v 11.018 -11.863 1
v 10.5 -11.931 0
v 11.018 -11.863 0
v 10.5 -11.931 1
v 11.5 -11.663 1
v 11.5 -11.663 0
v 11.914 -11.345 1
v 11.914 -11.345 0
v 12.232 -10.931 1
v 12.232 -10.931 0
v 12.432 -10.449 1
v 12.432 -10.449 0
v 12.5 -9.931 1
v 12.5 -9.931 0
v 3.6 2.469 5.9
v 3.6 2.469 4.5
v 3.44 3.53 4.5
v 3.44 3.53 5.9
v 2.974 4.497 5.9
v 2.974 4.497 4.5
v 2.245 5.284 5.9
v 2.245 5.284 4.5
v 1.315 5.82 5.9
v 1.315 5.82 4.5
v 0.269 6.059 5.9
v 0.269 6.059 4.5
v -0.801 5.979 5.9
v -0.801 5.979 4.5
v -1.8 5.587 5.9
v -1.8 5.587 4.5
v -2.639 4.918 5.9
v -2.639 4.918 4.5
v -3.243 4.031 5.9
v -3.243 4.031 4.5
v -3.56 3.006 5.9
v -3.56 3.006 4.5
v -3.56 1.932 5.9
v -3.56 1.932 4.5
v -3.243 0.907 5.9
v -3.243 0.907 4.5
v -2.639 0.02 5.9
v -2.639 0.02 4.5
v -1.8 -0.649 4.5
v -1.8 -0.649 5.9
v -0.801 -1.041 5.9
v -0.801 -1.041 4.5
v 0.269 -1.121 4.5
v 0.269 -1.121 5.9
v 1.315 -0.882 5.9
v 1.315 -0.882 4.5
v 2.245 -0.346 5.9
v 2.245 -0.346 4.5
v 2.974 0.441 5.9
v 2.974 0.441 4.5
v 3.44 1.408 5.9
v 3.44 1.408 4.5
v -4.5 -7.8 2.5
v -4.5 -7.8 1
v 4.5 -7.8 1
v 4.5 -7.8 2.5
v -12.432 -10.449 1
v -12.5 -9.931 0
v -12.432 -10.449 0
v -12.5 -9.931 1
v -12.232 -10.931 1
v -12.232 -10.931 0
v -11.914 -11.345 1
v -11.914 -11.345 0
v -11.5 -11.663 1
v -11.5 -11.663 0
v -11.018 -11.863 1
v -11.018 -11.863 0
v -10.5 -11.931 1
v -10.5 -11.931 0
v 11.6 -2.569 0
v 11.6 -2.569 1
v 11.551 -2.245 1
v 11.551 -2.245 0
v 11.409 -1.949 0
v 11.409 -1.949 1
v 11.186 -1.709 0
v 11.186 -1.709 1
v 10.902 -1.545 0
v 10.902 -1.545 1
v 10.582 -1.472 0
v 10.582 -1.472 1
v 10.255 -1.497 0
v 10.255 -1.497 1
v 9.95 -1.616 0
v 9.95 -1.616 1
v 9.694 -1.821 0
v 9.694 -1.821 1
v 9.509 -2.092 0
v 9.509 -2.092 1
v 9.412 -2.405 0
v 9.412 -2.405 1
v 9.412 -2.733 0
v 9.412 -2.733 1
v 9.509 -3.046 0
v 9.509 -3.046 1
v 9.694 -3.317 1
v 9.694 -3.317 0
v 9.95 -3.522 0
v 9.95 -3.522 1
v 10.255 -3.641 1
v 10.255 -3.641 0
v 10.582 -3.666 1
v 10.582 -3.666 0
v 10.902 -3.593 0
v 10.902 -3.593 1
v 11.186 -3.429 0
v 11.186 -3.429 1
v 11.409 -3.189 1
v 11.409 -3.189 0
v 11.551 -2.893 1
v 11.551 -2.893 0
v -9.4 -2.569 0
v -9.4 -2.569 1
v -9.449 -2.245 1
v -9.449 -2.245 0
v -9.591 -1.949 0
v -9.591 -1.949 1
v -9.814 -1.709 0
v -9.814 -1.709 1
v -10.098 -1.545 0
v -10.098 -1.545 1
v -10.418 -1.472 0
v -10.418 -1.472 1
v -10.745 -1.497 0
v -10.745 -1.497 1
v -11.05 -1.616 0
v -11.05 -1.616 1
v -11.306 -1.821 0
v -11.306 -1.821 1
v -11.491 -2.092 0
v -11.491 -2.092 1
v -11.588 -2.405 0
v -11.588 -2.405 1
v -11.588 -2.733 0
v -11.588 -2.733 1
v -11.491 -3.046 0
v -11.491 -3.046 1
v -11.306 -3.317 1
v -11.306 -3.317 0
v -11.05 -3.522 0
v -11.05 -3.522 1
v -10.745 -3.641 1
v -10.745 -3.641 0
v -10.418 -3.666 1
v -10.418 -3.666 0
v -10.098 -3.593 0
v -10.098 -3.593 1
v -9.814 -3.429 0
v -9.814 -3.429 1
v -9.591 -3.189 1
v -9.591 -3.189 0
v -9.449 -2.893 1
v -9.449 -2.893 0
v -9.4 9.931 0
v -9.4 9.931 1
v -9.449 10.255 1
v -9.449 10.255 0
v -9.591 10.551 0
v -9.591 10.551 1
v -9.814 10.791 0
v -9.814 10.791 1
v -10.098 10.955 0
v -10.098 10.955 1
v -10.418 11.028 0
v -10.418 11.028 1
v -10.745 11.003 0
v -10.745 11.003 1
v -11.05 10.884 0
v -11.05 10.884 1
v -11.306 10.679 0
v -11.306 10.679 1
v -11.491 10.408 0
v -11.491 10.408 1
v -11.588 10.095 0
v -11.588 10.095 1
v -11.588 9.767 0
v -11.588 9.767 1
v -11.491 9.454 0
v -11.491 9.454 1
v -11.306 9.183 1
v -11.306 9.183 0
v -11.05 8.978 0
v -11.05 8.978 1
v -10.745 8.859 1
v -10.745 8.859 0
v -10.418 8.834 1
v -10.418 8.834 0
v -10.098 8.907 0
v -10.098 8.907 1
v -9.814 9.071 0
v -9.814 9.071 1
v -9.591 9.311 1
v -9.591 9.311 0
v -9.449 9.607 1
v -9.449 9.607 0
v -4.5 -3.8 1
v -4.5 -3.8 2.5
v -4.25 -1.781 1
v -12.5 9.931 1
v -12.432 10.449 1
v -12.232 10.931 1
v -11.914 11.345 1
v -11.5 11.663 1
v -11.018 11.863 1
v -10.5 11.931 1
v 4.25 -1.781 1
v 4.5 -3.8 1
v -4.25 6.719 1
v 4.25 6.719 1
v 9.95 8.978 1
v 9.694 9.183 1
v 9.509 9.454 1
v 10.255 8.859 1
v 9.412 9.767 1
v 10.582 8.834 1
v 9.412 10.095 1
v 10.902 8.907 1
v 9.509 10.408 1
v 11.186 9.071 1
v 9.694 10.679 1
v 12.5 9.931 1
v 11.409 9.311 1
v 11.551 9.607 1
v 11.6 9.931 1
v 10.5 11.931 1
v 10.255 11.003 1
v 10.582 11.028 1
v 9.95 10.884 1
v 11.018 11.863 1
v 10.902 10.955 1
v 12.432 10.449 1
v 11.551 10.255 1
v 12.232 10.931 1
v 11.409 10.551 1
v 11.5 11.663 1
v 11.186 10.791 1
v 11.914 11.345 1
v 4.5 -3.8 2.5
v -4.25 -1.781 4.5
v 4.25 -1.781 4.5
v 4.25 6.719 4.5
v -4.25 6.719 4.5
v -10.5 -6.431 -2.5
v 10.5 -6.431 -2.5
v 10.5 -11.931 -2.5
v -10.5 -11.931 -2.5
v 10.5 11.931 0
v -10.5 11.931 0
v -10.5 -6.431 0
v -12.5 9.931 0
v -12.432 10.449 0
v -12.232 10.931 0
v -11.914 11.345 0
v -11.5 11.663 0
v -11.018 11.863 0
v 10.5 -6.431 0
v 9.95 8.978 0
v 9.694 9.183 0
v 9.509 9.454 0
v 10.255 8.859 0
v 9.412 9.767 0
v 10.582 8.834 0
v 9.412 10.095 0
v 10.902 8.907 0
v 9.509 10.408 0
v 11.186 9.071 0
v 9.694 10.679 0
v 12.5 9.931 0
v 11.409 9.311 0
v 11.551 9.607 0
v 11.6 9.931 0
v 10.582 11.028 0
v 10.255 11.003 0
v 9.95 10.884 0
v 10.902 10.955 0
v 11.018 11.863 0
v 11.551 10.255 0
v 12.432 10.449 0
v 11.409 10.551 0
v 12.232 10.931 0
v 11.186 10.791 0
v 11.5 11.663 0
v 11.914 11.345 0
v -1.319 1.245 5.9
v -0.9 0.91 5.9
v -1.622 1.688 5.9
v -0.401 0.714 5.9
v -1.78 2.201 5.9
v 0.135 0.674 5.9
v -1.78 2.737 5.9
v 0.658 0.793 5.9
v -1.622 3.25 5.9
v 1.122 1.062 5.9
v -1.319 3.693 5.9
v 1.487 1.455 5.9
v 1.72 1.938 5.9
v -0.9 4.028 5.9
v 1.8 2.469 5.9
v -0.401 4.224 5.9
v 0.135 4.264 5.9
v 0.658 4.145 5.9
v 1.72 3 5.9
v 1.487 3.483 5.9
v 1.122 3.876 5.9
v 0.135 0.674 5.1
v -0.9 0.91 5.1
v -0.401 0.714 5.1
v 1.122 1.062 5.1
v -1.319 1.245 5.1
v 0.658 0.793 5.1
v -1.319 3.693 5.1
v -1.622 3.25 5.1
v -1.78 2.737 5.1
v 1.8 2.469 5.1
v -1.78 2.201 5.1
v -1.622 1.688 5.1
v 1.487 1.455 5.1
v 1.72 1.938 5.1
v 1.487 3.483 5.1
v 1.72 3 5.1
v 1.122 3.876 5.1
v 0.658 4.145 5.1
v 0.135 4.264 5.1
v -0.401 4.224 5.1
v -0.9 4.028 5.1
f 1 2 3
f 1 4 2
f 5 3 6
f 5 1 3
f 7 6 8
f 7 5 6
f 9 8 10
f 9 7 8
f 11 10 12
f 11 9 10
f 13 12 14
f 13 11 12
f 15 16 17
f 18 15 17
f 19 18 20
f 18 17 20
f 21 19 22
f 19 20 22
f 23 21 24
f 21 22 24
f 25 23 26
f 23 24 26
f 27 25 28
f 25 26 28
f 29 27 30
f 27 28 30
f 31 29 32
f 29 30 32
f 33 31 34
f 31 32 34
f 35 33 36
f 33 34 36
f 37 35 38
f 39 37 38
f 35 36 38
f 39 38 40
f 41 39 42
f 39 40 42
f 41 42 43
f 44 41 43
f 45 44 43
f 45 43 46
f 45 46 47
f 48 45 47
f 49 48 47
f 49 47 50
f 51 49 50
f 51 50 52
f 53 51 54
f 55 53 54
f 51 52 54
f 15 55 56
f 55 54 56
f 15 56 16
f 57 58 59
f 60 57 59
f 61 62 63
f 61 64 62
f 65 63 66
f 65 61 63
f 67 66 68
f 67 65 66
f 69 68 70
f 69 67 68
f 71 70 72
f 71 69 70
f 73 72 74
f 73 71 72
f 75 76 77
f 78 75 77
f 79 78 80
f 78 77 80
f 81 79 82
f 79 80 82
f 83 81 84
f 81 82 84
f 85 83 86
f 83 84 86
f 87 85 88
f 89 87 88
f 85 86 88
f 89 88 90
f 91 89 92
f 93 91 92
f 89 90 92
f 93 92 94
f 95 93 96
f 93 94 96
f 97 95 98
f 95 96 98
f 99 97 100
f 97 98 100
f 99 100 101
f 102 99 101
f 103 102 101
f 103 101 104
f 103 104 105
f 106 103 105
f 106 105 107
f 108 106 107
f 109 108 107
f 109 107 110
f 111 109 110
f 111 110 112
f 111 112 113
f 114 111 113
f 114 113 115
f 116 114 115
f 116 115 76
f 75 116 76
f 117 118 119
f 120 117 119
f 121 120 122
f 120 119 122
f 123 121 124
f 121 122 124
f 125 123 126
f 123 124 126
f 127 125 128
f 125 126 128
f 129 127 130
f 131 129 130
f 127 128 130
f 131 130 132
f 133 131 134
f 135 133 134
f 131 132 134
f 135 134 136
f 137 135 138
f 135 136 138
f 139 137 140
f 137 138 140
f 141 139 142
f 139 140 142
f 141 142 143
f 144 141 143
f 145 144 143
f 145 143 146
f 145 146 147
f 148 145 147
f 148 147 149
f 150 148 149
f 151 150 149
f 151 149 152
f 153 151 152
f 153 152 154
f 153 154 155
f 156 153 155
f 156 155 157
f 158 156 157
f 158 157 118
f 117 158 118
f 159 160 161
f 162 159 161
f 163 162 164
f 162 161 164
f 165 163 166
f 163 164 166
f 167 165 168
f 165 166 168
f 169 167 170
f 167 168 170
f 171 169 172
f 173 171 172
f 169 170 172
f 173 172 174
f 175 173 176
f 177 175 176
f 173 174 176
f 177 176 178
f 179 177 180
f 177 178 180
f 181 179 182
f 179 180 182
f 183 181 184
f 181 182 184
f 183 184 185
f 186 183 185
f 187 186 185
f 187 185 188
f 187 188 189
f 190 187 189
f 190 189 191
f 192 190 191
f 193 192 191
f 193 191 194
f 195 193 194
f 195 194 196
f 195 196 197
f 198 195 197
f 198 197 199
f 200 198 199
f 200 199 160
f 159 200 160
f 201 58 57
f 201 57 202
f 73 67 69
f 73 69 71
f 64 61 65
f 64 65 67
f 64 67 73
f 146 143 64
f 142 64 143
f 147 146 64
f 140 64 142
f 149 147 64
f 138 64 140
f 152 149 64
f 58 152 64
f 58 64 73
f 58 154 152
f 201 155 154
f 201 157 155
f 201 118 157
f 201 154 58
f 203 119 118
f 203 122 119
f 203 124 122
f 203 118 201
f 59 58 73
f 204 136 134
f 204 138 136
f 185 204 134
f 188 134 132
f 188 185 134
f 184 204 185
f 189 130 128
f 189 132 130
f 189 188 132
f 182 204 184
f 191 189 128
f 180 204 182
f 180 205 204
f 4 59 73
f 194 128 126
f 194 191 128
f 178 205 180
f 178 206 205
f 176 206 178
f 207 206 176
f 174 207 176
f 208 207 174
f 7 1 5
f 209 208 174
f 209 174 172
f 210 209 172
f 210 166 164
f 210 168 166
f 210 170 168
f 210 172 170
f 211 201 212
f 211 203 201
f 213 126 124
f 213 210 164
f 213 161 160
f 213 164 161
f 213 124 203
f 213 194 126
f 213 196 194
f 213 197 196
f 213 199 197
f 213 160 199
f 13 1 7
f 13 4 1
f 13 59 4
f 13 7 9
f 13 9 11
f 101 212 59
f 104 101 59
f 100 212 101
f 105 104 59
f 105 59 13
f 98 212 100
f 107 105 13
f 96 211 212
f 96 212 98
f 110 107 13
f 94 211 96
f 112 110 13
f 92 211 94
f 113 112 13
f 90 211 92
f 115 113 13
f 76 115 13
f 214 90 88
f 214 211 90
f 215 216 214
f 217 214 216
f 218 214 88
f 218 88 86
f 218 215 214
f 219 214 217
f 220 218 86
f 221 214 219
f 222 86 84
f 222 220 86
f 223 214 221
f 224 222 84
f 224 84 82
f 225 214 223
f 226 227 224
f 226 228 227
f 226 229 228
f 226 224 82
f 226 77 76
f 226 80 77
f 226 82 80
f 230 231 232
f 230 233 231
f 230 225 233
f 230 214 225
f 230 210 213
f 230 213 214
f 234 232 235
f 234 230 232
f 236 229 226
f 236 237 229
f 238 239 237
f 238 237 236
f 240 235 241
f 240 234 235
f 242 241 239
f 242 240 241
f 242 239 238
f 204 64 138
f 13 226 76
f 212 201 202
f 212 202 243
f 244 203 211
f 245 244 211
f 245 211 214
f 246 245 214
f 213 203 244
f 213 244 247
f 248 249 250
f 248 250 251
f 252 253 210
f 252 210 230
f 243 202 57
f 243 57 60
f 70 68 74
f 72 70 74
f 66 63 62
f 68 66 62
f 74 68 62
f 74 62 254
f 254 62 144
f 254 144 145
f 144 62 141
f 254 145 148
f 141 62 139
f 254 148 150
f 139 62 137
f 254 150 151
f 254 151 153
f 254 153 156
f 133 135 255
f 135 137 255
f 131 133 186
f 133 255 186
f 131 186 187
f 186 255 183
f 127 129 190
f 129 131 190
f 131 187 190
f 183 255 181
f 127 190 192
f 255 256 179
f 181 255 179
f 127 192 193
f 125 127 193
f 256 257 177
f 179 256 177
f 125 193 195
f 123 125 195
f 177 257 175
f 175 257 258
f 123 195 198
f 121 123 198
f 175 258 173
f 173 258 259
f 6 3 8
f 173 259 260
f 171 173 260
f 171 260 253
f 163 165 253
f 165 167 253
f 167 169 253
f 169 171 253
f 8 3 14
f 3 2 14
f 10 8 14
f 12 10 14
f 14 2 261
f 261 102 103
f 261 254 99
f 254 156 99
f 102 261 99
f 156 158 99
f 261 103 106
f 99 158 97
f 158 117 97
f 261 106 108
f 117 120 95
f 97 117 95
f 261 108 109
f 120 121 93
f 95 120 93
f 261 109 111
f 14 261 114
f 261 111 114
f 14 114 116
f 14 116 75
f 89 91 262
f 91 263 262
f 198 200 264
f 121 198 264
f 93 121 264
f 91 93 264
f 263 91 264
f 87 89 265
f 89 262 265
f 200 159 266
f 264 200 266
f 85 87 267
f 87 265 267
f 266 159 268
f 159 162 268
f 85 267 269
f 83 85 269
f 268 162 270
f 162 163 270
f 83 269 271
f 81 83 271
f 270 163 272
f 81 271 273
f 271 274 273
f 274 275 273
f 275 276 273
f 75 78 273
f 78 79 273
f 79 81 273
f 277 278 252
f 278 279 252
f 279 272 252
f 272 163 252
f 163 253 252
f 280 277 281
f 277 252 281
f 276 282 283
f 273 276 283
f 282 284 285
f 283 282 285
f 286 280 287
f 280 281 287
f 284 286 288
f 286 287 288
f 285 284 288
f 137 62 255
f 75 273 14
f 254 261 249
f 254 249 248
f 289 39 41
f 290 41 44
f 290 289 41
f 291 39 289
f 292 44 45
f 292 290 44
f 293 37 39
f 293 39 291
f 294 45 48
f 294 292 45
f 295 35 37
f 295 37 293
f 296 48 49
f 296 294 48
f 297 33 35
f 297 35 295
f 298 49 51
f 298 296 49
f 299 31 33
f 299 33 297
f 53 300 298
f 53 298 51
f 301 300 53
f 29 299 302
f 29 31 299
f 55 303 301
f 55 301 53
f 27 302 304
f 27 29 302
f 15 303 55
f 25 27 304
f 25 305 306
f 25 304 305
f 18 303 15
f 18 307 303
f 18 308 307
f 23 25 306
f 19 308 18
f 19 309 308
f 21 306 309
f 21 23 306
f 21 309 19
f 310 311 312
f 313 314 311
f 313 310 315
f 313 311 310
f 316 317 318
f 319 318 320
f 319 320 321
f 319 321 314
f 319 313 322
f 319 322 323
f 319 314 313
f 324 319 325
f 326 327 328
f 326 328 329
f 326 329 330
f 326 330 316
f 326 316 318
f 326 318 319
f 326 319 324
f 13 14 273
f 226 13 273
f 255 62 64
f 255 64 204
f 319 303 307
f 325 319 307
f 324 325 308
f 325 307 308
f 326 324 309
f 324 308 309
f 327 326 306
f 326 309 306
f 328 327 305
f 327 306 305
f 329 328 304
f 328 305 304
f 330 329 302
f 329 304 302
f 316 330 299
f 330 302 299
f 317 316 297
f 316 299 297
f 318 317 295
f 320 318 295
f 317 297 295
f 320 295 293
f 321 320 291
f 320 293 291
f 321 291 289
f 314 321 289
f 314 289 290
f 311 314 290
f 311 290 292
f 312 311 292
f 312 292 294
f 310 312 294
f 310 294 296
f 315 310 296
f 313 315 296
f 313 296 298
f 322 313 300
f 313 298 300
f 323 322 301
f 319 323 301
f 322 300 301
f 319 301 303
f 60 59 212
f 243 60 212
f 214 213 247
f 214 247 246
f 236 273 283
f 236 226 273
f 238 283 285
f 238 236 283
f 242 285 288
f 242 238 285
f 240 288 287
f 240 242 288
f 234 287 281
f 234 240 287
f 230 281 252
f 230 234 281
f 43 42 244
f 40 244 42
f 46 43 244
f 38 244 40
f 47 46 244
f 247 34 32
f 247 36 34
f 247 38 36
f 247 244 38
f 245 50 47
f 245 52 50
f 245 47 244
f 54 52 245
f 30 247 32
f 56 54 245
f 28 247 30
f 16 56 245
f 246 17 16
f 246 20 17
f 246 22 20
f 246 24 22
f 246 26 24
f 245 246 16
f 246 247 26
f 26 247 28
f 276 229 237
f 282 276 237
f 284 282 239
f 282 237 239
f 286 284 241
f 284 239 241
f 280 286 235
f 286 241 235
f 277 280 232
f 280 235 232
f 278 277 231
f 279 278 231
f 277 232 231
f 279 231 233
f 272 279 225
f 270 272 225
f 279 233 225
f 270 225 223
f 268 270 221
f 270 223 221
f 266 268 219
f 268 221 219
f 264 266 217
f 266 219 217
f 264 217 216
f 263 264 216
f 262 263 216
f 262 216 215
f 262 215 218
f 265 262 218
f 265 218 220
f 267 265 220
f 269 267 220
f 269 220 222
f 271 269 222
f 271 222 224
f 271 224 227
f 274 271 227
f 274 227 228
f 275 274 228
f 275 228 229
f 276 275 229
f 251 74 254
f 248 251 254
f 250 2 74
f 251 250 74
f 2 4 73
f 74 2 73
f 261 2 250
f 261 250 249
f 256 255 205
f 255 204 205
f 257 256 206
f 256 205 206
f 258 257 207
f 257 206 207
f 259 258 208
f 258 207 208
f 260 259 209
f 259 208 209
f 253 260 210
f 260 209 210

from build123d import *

# Parameters (mm, degrees)
SKETCH1_W            = 25
SKETCH1_H            = 23.862
PCB_BOARD_DEPTH      = 1
PCB_CORNER_FILLETS_R = 2
SKETCH2_R            = 1.1
MOUNTING_HOLES_DEPTH = 18.308921428
SKETCH3_W            = 8.5
SKETCH3_H            = 8.5
SENSOR_HOUSING_DEPTH = 3.5
SKETCH4_R            = 3.6
LENS_BARREL_DEPTH    = 1.4
SKETCH5_R            = 1.8
LENS_APERTURE_DEPTH  = 0.8
SKETCH6_W            = 21
SKETCH6_H            = 5.5
CSI_CONNECTOR_DEPTH  = 2.5
SKETCH7_W            = 9
SKETCH7_H            = 4
FLEX_CONNECTOR_DEPTH = 1.5


with BuildPart() as part:
    # Sketch1 → PCB_Board (new body)
    with BuildSketch(Plane.XY):
        Rectangle(SKETCH1_W, SKETCH1_H)
    extrude(amount=PCB_BOARD_DEPTH)

    # PCB_Corner_Fillets
    pcb_corner_fillets_edges = [part.edges().sort_by_distance(p)[0] for p in [
        (-12.5, 11.931, 0.5),
        (12.5, 11.931, 0.5),
        (12.5, -11.931, 0.5),
        (-12.5, -11.931, 0.5),
    ]]
    fillet(pcb_corner_fillets_edges, radius=PCB_CORNER_FILLETS_R)

    # Sketch2 → Mounting_Holes (cut, through all)
    with BuildSketch(Plane.XY.offset(1)):
        with Locations((10.5, 9.931)):
            Circle(SKETCH2_R)
        with Locations((-10.5, 9.931)):
            Circle(SKETCH2_R)
        with Locations((10.5, -2.569)):
            Circle(SKETCH2_R)
        with Locations((-10.5, -2.569)):
            Circle(SKETCH2_R)
    extrude(amount=-MOUNTING_HOLES_DEPTH, mode=Mode.SUBTRACT)

    # Sketch3 → Sensor_Housing (add)
    with BuildSketch(Plane.XY.offset(1)):
        with Locations((0, 2.469)):
            Rectangle(SKETCH3_W, SKETCH3_H)
    extrude(amount=SENSOR_HOUSING_DEPTH)

    # Sketch4 → Lens_Barrel (add)
    with BuildSketch(Plane.XY.offset(4.5)):
        with Locations((0, 2.469)):
            Circle(SKETCH4_R)
    extrude(amount=LENS_BARREL_DEPTH)

    # Sketch5 → Lens_Aperture (cut)
    with BuildSketch(Plane.XY.offset(5.9)):
        with Locations((0, 2.469)):
            Circle(SKETCH5_R)
    extrude(amount=-LENS_APERTURE_DEPTH, mode=Mode.SUBTRACT)

    # Sketch6 → CSI_Connector (add)
    with BuildSketch(Plane(origin=(0, 0, 0), x_dir=(-1, 0, 0), z_dir=(0, 0, -1))):
        with Locations((0, -9.181)):
            Rectangle(SKETCH6_W, SKETCH6_H)
    extrude(amount=CSI_CONNECTOR_DEPTH)

    # Sketch7 → Flex_Connector (add)
    with BuildSketch(Plane.XY.offset(1)):
        with Locations((0, -5.8)):
            Rectangle(SKETCH7_W, SKETCH7_H)
    extrude(amount=FLEX_CONNECTOR_DEPTH)


solid = part.part
